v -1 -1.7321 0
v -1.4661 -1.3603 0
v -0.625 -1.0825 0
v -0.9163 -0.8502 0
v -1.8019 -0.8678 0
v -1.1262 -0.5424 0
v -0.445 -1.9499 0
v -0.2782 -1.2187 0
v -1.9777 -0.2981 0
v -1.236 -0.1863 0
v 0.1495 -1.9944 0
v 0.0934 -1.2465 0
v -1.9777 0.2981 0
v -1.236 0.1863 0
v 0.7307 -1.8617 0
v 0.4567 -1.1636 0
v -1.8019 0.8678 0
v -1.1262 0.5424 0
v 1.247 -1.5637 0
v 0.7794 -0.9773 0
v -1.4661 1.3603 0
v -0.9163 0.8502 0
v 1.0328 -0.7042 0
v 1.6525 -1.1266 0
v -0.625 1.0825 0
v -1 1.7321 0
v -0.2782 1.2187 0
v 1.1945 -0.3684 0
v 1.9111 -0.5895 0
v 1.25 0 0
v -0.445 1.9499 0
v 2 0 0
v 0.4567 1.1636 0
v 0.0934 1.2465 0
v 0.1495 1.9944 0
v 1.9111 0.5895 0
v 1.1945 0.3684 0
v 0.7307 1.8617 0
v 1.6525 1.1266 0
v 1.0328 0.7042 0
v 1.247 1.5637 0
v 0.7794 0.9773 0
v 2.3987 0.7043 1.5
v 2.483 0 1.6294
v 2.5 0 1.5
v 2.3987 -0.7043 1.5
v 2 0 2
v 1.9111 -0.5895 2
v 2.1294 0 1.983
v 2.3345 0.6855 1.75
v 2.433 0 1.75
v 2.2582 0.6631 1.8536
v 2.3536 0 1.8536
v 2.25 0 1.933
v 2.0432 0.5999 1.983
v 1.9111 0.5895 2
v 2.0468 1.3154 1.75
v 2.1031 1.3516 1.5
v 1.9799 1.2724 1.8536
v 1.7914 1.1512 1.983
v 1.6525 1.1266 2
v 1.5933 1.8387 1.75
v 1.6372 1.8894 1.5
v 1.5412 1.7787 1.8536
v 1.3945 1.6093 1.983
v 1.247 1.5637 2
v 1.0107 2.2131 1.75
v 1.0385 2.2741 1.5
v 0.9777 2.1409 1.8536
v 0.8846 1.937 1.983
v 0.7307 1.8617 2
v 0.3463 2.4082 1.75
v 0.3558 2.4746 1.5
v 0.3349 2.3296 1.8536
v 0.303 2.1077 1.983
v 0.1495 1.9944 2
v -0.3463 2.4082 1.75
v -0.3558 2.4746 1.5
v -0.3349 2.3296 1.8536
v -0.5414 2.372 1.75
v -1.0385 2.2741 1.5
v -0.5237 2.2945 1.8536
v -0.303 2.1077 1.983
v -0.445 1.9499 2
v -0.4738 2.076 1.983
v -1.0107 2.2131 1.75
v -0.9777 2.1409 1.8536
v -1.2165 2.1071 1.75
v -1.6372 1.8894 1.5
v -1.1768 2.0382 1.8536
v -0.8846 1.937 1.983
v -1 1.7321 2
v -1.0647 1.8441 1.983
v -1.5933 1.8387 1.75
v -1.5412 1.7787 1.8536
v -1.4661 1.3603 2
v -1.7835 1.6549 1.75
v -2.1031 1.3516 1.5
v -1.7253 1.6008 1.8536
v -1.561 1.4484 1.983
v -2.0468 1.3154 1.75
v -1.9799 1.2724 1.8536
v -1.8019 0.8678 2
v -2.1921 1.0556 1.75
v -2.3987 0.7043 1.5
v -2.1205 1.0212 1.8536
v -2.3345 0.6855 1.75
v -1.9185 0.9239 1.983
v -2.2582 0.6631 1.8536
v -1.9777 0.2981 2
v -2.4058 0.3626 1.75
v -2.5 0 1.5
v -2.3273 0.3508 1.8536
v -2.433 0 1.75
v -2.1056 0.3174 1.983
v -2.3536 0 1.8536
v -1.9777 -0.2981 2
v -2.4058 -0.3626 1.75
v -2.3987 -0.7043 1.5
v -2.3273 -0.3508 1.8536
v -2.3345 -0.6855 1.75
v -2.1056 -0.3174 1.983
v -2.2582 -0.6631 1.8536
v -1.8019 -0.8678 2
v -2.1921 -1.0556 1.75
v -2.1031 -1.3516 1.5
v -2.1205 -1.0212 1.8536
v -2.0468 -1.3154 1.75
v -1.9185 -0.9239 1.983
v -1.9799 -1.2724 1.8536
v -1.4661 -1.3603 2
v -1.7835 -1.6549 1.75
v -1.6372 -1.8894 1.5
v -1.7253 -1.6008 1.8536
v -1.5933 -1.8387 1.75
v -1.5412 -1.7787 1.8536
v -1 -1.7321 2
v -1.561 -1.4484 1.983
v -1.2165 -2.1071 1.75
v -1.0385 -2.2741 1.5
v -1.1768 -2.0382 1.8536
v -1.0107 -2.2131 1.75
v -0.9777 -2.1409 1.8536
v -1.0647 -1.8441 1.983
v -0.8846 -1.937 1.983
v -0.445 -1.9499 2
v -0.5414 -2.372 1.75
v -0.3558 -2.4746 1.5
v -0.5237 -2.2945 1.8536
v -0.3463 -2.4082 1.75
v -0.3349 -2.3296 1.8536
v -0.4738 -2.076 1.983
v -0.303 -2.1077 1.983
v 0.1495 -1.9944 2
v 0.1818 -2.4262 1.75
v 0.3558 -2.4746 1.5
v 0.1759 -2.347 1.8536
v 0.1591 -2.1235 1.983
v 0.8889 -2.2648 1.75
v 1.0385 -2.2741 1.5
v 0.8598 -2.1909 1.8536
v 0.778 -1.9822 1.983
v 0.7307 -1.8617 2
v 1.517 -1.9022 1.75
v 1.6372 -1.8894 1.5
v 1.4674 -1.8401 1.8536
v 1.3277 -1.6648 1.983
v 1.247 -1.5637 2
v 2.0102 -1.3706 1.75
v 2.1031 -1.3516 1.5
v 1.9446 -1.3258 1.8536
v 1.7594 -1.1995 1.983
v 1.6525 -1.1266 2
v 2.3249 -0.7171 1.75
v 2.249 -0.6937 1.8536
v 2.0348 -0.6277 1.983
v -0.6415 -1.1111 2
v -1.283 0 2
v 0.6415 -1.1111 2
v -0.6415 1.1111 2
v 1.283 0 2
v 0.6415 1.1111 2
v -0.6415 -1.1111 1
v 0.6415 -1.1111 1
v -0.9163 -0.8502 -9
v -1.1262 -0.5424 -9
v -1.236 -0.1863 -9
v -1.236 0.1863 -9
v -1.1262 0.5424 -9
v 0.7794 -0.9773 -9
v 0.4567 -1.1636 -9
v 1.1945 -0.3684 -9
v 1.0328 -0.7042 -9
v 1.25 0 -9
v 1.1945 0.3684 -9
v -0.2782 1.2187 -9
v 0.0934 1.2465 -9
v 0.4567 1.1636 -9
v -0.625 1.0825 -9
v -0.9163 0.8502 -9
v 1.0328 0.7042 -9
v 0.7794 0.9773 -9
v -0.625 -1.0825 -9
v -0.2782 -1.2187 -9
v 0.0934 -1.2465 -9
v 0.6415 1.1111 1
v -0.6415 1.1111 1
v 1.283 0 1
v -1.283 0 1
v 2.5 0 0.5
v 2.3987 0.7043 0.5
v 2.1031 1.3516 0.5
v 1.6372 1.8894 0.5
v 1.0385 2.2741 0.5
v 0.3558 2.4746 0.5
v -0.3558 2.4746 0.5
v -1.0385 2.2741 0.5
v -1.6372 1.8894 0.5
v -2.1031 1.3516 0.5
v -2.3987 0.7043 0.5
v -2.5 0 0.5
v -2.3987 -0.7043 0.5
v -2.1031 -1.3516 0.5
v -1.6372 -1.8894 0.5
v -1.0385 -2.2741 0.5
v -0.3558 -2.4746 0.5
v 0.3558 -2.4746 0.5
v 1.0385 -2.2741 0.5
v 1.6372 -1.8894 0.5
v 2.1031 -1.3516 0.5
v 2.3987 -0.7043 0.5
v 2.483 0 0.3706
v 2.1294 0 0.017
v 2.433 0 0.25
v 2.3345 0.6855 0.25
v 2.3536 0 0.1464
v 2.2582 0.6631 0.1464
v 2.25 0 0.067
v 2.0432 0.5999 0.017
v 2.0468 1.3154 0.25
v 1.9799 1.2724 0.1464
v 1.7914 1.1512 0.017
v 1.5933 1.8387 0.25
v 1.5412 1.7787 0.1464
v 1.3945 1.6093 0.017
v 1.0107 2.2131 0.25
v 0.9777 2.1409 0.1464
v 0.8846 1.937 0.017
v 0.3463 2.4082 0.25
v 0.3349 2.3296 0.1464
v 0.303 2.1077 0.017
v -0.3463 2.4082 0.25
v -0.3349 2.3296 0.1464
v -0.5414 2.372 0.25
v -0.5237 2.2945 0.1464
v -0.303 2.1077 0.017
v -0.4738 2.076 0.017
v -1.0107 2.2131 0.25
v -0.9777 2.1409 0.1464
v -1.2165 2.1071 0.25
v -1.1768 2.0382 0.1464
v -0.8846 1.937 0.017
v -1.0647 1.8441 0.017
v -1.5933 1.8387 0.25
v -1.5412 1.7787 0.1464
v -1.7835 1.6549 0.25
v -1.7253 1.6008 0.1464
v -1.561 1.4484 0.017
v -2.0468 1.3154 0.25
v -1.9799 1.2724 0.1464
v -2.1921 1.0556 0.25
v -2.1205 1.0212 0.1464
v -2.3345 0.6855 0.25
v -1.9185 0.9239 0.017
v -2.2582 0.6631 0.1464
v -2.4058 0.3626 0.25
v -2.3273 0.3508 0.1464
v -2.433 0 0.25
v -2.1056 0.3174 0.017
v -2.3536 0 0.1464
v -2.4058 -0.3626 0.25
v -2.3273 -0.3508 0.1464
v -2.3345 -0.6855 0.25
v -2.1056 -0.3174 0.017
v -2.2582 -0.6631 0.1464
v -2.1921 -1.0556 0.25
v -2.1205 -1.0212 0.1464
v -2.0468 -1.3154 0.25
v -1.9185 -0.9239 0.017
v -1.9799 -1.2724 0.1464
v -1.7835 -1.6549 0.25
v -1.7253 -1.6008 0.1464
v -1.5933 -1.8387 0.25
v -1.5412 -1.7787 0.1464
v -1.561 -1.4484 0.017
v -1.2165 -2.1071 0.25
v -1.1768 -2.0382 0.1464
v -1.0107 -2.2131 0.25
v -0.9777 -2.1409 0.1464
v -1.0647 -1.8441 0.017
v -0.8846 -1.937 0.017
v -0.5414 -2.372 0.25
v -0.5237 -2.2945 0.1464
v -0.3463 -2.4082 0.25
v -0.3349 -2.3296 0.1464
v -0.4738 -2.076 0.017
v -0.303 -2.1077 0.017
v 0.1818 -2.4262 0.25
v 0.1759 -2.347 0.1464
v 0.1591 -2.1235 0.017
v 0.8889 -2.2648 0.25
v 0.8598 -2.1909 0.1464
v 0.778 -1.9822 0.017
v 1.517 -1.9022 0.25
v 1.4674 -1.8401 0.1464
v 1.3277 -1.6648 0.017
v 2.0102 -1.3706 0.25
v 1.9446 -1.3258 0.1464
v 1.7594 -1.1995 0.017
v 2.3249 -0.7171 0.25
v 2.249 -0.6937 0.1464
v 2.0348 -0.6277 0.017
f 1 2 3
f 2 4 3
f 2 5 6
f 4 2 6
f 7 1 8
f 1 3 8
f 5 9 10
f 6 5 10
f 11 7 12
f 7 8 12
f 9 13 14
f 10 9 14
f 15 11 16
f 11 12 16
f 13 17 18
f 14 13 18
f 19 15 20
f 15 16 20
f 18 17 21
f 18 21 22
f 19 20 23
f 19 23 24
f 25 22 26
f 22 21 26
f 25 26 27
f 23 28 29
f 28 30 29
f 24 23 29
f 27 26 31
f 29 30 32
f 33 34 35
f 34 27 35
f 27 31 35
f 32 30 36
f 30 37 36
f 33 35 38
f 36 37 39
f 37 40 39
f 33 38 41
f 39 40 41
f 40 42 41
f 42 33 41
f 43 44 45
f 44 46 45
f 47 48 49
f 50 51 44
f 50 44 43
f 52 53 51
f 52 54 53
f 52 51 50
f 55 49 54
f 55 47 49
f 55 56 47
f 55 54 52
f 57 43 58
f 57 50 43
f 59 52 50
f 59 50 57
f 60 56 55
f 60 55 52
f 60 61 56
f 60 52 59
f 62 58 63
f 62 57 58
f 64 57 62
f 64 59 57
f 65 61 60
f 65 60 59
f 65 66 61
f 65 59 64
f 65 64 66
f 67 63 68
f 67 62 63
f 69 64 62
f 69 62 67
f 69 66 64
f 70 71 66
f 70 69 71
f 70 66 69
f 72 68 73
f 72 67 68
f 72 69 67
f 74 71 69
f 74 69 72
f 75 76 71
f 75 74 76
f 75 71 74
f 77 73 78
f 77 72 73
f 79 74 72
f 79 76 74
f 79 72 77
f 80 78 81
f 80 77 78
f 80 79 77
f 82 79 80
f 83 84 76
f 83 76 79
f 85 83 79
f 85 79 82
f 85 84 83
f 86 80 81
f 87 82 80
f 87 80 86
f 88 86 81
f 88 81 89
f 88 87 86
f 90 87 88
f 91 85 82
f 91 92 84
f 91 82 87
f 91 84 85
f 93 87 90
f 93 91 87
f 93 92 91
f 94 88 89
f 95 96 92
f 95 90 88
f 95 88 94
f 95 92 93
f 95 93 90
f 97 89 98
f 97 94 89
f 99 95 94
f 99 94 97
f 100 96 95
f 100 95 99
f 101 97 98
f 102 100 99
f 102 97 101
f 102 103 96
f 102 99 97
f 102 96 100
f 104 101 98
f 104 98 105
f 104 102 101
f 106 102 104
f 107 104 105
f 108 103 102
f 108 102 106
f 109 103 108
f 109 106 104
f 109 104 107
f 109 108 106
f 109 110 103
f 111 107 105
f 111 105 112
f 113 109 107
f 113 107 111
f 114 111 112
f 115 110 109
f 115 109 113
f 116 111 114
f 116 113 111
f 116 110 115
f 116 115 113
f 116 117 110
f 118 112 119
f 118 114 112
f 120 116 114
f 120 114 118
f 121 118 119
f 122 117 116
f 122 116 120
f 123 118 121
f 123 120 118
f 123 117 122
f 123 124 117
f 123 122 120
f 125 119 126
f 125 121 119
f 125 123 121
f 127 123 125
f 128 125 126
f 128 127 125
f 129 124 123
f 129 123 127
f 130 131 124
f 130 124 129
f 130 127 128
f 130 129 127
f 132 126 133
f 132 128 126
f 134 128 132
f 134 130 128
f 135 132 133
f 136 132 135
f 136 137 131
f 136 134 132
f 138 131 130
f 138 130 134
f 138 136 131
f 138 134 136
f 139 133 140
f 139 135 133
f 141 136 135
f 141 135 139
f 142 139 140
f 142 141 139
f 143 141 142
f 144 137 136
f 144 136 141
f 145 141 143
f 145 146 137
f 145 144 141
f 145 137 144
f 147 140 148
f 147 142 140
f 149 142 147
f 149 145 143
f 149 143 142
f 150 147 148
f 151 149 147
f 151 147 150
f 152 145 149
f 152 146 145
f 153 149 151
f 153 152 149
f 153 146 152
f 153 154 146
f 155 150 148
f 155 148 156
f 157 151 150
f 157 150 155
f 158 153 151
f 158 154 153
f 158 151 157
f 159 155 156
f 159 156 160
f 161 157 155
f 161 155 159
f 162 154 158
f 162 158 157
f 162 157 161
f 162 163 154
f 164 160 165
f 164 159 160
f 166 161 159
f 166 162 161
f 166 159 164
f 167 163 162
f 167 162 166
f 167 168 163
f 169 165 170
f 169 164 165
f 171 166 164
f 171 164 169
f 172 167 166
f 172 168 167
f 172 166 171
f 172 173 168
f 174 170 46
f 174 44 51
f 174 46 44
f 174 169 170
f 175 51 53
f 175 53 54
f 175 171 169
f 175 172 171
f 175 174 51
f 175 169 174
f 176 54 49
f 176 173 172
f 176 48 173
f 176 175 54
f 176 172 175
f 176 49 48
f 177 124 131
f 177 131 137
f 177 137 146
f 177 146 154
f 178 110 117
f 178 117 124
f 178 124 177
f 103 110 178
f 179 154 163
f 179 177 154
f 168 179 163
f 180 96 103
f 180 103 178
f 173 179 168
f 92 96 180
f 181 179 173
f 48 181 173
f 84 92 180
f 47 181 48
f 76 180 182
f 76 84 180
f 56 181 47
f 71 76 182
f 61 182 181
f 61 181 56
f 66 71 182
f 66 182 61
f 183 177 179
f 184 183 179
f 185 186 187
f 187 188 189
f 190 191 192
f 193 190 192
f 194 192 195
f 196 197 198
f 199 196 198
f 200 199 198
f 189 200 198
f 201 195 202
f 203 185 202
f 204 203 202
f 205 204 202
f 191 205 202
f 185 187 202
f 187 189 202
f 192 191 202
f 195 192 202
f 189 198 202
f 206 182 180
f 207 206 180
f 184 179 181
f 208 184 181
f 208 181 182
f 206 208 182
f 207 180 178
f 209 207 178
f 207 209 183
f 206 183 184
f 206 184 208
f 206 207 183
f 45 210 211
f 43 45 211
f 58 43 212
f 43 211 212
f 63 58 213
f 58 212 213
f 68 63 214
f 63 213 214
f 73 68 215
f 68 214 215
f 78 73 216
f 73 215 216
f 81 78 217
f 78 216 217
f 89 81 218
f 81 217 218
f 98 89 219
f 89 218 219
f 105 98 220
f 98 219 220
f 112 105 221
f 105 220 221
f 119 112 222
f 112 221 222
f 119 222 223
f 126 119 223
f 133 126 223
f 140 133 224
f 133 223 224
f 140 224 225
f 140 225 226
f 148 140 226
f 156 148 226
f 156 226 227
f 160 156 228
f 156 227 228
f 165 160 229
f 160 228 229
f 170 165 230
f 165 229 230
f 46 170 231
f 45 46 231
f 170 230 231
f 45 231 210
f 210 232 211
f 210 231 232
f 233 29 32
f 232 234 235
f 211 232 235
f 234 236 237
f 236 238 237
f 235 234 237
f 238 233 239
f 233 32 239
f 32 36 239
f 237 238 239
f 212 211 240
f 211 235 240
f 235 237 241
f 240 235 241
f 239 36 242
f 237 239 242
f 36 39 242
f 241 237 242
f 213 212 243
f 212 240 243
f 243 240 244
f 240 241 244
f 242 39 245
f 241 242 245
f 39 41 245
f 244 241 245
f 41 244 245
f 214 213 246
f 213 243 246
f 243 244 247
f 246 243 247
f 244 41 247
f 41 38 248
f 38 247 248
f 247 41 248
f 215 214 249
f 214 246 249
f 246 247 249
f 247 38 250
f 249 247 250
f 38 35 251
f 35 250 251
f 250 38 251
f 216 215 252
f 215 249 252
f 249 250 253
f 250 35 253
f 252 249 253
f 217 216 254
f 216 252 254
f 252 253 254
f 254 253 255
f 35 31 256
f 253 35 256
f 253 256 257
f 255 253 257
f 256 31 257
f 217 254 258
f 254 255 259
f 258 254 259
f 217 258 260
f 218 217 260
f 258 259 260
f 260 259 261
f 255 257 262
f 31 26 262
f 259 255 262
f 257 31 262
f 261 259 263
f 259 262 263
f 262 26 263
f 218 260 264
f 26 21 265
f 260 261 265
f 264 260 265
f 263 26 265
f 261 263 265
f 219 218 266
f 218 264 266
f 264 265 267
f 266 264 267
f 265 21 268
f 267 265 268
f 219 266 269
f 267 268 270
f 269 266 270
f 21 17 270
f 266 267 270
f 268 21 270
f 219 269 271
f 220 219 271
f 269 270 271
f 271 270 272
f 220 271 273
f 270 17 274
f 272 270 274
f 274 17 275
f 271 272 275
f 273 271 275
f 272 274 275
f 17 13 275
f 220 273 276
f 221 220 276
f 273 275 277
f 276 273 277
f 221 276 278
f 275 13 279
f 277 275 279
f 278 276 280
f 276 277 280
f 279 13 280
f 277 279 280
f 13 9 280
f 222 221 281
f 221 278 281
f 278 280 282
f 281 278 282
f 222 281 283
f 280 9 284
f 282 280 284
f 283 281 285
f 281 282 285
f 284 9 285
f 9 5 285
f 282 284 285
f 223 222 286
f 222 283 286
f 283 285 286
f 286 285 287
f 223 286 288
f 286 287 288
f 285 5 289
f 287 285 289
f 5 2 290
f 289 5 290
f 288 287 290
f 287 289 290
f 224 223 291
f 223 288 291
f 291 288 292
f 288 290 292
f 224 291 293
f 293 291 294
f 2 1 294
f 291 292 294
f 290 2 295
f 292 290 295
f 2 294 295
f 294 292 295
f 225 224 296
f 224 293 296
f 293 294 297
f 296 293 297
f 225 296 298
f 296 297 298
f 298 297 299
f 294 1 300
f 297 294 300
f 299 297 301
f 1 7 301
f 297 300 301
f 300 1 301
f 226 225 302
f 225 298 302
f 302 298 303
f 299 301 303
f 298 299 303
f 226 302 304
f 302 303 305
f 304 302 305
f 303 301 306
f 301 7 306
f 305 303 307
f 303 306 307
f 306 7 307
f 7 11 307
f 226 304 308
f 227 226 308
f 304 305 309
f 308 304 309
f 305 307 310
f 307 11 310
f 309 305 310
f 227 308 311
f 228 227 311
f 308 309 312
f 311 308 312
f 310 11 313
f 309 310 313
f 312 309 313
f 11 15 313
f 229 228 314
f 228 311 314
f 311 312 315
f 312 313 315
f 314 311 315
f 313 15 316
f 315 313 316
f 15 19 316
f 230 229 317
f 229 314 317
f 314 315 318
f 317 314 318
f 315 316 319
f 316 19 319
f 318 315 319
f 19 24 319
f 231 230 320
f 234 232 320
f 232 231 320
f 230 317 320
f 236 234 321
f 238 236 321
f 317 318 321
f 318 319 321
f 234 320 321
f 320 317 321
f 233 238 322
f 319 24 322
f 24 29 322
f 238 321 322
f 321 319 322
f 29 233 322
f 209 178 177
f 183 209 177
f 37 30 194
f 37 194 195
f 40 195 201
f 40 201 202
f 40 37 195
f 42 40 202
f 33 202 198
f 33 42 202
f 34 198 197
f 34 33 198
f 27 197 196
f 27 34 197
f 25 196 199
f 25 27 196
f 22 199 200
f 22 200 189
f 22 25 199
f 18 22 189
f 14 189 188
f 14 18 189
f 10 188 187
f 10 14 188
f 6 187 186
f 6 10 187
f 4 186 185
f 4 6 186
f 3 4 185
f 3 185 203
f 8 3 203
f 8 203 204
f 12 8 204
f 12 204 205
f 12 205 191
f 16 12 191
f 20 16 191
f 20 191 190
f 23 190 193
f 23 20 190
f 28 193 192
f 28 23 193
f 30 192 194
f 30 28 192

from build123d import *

# Parameters (mm, degrees)
SKETCH1_R           = 1.25
BOSS_EXTRUDE1_DEPTH = 9
SKETCH2_R           = 2.5
BOSS_EXTRUDE2_DEPTH = 2
CUT_EXTRUDE1_DEPTH  = 1
FILLET1_R           = 0.5


with BuildPart() as part:
    # Sketch1 → Boss-Extrude1 (new body)
    with BuildSketch(Plane.XY):
        Circle(SKETCH1_R)
    extrude(amount=-BOSS_EXTRUDE1_DEPTH)

    # Sketch2 → Boss-Extrude2 (add)
    with BuildSketch(Plane.XY):
        Circle(SKETCH2_R)
    extrude(amount=BOSS_EXTRUDE2_DEPTH)

    # Sketch3 → Cut-Extrude1 (cut)
    with BuildSketch(Plane.XY.offset(2)):
        Polygon((1.283002505, 0), (0.641501252, 1.111112762), (-0.641501252, 1.111112762), (-1.283002505, 0), (-0.641501252, -1.111112762), (0.641501252, -1.111112762), align=None)
    extrude(amount=-CUT_EXTRUDE1_DEPTH, mode=Mode.SUBTRACT)

    # Fillet1
    fillet1_edges = [part.edges().sort_by_distance(p)[0] for p in [
        (-2.5, 0, 0),
        (-2.5, 0, 2),
    ]]
    fillet(fillet1_edges, radius=FILLET1_R)


solid = part.part
